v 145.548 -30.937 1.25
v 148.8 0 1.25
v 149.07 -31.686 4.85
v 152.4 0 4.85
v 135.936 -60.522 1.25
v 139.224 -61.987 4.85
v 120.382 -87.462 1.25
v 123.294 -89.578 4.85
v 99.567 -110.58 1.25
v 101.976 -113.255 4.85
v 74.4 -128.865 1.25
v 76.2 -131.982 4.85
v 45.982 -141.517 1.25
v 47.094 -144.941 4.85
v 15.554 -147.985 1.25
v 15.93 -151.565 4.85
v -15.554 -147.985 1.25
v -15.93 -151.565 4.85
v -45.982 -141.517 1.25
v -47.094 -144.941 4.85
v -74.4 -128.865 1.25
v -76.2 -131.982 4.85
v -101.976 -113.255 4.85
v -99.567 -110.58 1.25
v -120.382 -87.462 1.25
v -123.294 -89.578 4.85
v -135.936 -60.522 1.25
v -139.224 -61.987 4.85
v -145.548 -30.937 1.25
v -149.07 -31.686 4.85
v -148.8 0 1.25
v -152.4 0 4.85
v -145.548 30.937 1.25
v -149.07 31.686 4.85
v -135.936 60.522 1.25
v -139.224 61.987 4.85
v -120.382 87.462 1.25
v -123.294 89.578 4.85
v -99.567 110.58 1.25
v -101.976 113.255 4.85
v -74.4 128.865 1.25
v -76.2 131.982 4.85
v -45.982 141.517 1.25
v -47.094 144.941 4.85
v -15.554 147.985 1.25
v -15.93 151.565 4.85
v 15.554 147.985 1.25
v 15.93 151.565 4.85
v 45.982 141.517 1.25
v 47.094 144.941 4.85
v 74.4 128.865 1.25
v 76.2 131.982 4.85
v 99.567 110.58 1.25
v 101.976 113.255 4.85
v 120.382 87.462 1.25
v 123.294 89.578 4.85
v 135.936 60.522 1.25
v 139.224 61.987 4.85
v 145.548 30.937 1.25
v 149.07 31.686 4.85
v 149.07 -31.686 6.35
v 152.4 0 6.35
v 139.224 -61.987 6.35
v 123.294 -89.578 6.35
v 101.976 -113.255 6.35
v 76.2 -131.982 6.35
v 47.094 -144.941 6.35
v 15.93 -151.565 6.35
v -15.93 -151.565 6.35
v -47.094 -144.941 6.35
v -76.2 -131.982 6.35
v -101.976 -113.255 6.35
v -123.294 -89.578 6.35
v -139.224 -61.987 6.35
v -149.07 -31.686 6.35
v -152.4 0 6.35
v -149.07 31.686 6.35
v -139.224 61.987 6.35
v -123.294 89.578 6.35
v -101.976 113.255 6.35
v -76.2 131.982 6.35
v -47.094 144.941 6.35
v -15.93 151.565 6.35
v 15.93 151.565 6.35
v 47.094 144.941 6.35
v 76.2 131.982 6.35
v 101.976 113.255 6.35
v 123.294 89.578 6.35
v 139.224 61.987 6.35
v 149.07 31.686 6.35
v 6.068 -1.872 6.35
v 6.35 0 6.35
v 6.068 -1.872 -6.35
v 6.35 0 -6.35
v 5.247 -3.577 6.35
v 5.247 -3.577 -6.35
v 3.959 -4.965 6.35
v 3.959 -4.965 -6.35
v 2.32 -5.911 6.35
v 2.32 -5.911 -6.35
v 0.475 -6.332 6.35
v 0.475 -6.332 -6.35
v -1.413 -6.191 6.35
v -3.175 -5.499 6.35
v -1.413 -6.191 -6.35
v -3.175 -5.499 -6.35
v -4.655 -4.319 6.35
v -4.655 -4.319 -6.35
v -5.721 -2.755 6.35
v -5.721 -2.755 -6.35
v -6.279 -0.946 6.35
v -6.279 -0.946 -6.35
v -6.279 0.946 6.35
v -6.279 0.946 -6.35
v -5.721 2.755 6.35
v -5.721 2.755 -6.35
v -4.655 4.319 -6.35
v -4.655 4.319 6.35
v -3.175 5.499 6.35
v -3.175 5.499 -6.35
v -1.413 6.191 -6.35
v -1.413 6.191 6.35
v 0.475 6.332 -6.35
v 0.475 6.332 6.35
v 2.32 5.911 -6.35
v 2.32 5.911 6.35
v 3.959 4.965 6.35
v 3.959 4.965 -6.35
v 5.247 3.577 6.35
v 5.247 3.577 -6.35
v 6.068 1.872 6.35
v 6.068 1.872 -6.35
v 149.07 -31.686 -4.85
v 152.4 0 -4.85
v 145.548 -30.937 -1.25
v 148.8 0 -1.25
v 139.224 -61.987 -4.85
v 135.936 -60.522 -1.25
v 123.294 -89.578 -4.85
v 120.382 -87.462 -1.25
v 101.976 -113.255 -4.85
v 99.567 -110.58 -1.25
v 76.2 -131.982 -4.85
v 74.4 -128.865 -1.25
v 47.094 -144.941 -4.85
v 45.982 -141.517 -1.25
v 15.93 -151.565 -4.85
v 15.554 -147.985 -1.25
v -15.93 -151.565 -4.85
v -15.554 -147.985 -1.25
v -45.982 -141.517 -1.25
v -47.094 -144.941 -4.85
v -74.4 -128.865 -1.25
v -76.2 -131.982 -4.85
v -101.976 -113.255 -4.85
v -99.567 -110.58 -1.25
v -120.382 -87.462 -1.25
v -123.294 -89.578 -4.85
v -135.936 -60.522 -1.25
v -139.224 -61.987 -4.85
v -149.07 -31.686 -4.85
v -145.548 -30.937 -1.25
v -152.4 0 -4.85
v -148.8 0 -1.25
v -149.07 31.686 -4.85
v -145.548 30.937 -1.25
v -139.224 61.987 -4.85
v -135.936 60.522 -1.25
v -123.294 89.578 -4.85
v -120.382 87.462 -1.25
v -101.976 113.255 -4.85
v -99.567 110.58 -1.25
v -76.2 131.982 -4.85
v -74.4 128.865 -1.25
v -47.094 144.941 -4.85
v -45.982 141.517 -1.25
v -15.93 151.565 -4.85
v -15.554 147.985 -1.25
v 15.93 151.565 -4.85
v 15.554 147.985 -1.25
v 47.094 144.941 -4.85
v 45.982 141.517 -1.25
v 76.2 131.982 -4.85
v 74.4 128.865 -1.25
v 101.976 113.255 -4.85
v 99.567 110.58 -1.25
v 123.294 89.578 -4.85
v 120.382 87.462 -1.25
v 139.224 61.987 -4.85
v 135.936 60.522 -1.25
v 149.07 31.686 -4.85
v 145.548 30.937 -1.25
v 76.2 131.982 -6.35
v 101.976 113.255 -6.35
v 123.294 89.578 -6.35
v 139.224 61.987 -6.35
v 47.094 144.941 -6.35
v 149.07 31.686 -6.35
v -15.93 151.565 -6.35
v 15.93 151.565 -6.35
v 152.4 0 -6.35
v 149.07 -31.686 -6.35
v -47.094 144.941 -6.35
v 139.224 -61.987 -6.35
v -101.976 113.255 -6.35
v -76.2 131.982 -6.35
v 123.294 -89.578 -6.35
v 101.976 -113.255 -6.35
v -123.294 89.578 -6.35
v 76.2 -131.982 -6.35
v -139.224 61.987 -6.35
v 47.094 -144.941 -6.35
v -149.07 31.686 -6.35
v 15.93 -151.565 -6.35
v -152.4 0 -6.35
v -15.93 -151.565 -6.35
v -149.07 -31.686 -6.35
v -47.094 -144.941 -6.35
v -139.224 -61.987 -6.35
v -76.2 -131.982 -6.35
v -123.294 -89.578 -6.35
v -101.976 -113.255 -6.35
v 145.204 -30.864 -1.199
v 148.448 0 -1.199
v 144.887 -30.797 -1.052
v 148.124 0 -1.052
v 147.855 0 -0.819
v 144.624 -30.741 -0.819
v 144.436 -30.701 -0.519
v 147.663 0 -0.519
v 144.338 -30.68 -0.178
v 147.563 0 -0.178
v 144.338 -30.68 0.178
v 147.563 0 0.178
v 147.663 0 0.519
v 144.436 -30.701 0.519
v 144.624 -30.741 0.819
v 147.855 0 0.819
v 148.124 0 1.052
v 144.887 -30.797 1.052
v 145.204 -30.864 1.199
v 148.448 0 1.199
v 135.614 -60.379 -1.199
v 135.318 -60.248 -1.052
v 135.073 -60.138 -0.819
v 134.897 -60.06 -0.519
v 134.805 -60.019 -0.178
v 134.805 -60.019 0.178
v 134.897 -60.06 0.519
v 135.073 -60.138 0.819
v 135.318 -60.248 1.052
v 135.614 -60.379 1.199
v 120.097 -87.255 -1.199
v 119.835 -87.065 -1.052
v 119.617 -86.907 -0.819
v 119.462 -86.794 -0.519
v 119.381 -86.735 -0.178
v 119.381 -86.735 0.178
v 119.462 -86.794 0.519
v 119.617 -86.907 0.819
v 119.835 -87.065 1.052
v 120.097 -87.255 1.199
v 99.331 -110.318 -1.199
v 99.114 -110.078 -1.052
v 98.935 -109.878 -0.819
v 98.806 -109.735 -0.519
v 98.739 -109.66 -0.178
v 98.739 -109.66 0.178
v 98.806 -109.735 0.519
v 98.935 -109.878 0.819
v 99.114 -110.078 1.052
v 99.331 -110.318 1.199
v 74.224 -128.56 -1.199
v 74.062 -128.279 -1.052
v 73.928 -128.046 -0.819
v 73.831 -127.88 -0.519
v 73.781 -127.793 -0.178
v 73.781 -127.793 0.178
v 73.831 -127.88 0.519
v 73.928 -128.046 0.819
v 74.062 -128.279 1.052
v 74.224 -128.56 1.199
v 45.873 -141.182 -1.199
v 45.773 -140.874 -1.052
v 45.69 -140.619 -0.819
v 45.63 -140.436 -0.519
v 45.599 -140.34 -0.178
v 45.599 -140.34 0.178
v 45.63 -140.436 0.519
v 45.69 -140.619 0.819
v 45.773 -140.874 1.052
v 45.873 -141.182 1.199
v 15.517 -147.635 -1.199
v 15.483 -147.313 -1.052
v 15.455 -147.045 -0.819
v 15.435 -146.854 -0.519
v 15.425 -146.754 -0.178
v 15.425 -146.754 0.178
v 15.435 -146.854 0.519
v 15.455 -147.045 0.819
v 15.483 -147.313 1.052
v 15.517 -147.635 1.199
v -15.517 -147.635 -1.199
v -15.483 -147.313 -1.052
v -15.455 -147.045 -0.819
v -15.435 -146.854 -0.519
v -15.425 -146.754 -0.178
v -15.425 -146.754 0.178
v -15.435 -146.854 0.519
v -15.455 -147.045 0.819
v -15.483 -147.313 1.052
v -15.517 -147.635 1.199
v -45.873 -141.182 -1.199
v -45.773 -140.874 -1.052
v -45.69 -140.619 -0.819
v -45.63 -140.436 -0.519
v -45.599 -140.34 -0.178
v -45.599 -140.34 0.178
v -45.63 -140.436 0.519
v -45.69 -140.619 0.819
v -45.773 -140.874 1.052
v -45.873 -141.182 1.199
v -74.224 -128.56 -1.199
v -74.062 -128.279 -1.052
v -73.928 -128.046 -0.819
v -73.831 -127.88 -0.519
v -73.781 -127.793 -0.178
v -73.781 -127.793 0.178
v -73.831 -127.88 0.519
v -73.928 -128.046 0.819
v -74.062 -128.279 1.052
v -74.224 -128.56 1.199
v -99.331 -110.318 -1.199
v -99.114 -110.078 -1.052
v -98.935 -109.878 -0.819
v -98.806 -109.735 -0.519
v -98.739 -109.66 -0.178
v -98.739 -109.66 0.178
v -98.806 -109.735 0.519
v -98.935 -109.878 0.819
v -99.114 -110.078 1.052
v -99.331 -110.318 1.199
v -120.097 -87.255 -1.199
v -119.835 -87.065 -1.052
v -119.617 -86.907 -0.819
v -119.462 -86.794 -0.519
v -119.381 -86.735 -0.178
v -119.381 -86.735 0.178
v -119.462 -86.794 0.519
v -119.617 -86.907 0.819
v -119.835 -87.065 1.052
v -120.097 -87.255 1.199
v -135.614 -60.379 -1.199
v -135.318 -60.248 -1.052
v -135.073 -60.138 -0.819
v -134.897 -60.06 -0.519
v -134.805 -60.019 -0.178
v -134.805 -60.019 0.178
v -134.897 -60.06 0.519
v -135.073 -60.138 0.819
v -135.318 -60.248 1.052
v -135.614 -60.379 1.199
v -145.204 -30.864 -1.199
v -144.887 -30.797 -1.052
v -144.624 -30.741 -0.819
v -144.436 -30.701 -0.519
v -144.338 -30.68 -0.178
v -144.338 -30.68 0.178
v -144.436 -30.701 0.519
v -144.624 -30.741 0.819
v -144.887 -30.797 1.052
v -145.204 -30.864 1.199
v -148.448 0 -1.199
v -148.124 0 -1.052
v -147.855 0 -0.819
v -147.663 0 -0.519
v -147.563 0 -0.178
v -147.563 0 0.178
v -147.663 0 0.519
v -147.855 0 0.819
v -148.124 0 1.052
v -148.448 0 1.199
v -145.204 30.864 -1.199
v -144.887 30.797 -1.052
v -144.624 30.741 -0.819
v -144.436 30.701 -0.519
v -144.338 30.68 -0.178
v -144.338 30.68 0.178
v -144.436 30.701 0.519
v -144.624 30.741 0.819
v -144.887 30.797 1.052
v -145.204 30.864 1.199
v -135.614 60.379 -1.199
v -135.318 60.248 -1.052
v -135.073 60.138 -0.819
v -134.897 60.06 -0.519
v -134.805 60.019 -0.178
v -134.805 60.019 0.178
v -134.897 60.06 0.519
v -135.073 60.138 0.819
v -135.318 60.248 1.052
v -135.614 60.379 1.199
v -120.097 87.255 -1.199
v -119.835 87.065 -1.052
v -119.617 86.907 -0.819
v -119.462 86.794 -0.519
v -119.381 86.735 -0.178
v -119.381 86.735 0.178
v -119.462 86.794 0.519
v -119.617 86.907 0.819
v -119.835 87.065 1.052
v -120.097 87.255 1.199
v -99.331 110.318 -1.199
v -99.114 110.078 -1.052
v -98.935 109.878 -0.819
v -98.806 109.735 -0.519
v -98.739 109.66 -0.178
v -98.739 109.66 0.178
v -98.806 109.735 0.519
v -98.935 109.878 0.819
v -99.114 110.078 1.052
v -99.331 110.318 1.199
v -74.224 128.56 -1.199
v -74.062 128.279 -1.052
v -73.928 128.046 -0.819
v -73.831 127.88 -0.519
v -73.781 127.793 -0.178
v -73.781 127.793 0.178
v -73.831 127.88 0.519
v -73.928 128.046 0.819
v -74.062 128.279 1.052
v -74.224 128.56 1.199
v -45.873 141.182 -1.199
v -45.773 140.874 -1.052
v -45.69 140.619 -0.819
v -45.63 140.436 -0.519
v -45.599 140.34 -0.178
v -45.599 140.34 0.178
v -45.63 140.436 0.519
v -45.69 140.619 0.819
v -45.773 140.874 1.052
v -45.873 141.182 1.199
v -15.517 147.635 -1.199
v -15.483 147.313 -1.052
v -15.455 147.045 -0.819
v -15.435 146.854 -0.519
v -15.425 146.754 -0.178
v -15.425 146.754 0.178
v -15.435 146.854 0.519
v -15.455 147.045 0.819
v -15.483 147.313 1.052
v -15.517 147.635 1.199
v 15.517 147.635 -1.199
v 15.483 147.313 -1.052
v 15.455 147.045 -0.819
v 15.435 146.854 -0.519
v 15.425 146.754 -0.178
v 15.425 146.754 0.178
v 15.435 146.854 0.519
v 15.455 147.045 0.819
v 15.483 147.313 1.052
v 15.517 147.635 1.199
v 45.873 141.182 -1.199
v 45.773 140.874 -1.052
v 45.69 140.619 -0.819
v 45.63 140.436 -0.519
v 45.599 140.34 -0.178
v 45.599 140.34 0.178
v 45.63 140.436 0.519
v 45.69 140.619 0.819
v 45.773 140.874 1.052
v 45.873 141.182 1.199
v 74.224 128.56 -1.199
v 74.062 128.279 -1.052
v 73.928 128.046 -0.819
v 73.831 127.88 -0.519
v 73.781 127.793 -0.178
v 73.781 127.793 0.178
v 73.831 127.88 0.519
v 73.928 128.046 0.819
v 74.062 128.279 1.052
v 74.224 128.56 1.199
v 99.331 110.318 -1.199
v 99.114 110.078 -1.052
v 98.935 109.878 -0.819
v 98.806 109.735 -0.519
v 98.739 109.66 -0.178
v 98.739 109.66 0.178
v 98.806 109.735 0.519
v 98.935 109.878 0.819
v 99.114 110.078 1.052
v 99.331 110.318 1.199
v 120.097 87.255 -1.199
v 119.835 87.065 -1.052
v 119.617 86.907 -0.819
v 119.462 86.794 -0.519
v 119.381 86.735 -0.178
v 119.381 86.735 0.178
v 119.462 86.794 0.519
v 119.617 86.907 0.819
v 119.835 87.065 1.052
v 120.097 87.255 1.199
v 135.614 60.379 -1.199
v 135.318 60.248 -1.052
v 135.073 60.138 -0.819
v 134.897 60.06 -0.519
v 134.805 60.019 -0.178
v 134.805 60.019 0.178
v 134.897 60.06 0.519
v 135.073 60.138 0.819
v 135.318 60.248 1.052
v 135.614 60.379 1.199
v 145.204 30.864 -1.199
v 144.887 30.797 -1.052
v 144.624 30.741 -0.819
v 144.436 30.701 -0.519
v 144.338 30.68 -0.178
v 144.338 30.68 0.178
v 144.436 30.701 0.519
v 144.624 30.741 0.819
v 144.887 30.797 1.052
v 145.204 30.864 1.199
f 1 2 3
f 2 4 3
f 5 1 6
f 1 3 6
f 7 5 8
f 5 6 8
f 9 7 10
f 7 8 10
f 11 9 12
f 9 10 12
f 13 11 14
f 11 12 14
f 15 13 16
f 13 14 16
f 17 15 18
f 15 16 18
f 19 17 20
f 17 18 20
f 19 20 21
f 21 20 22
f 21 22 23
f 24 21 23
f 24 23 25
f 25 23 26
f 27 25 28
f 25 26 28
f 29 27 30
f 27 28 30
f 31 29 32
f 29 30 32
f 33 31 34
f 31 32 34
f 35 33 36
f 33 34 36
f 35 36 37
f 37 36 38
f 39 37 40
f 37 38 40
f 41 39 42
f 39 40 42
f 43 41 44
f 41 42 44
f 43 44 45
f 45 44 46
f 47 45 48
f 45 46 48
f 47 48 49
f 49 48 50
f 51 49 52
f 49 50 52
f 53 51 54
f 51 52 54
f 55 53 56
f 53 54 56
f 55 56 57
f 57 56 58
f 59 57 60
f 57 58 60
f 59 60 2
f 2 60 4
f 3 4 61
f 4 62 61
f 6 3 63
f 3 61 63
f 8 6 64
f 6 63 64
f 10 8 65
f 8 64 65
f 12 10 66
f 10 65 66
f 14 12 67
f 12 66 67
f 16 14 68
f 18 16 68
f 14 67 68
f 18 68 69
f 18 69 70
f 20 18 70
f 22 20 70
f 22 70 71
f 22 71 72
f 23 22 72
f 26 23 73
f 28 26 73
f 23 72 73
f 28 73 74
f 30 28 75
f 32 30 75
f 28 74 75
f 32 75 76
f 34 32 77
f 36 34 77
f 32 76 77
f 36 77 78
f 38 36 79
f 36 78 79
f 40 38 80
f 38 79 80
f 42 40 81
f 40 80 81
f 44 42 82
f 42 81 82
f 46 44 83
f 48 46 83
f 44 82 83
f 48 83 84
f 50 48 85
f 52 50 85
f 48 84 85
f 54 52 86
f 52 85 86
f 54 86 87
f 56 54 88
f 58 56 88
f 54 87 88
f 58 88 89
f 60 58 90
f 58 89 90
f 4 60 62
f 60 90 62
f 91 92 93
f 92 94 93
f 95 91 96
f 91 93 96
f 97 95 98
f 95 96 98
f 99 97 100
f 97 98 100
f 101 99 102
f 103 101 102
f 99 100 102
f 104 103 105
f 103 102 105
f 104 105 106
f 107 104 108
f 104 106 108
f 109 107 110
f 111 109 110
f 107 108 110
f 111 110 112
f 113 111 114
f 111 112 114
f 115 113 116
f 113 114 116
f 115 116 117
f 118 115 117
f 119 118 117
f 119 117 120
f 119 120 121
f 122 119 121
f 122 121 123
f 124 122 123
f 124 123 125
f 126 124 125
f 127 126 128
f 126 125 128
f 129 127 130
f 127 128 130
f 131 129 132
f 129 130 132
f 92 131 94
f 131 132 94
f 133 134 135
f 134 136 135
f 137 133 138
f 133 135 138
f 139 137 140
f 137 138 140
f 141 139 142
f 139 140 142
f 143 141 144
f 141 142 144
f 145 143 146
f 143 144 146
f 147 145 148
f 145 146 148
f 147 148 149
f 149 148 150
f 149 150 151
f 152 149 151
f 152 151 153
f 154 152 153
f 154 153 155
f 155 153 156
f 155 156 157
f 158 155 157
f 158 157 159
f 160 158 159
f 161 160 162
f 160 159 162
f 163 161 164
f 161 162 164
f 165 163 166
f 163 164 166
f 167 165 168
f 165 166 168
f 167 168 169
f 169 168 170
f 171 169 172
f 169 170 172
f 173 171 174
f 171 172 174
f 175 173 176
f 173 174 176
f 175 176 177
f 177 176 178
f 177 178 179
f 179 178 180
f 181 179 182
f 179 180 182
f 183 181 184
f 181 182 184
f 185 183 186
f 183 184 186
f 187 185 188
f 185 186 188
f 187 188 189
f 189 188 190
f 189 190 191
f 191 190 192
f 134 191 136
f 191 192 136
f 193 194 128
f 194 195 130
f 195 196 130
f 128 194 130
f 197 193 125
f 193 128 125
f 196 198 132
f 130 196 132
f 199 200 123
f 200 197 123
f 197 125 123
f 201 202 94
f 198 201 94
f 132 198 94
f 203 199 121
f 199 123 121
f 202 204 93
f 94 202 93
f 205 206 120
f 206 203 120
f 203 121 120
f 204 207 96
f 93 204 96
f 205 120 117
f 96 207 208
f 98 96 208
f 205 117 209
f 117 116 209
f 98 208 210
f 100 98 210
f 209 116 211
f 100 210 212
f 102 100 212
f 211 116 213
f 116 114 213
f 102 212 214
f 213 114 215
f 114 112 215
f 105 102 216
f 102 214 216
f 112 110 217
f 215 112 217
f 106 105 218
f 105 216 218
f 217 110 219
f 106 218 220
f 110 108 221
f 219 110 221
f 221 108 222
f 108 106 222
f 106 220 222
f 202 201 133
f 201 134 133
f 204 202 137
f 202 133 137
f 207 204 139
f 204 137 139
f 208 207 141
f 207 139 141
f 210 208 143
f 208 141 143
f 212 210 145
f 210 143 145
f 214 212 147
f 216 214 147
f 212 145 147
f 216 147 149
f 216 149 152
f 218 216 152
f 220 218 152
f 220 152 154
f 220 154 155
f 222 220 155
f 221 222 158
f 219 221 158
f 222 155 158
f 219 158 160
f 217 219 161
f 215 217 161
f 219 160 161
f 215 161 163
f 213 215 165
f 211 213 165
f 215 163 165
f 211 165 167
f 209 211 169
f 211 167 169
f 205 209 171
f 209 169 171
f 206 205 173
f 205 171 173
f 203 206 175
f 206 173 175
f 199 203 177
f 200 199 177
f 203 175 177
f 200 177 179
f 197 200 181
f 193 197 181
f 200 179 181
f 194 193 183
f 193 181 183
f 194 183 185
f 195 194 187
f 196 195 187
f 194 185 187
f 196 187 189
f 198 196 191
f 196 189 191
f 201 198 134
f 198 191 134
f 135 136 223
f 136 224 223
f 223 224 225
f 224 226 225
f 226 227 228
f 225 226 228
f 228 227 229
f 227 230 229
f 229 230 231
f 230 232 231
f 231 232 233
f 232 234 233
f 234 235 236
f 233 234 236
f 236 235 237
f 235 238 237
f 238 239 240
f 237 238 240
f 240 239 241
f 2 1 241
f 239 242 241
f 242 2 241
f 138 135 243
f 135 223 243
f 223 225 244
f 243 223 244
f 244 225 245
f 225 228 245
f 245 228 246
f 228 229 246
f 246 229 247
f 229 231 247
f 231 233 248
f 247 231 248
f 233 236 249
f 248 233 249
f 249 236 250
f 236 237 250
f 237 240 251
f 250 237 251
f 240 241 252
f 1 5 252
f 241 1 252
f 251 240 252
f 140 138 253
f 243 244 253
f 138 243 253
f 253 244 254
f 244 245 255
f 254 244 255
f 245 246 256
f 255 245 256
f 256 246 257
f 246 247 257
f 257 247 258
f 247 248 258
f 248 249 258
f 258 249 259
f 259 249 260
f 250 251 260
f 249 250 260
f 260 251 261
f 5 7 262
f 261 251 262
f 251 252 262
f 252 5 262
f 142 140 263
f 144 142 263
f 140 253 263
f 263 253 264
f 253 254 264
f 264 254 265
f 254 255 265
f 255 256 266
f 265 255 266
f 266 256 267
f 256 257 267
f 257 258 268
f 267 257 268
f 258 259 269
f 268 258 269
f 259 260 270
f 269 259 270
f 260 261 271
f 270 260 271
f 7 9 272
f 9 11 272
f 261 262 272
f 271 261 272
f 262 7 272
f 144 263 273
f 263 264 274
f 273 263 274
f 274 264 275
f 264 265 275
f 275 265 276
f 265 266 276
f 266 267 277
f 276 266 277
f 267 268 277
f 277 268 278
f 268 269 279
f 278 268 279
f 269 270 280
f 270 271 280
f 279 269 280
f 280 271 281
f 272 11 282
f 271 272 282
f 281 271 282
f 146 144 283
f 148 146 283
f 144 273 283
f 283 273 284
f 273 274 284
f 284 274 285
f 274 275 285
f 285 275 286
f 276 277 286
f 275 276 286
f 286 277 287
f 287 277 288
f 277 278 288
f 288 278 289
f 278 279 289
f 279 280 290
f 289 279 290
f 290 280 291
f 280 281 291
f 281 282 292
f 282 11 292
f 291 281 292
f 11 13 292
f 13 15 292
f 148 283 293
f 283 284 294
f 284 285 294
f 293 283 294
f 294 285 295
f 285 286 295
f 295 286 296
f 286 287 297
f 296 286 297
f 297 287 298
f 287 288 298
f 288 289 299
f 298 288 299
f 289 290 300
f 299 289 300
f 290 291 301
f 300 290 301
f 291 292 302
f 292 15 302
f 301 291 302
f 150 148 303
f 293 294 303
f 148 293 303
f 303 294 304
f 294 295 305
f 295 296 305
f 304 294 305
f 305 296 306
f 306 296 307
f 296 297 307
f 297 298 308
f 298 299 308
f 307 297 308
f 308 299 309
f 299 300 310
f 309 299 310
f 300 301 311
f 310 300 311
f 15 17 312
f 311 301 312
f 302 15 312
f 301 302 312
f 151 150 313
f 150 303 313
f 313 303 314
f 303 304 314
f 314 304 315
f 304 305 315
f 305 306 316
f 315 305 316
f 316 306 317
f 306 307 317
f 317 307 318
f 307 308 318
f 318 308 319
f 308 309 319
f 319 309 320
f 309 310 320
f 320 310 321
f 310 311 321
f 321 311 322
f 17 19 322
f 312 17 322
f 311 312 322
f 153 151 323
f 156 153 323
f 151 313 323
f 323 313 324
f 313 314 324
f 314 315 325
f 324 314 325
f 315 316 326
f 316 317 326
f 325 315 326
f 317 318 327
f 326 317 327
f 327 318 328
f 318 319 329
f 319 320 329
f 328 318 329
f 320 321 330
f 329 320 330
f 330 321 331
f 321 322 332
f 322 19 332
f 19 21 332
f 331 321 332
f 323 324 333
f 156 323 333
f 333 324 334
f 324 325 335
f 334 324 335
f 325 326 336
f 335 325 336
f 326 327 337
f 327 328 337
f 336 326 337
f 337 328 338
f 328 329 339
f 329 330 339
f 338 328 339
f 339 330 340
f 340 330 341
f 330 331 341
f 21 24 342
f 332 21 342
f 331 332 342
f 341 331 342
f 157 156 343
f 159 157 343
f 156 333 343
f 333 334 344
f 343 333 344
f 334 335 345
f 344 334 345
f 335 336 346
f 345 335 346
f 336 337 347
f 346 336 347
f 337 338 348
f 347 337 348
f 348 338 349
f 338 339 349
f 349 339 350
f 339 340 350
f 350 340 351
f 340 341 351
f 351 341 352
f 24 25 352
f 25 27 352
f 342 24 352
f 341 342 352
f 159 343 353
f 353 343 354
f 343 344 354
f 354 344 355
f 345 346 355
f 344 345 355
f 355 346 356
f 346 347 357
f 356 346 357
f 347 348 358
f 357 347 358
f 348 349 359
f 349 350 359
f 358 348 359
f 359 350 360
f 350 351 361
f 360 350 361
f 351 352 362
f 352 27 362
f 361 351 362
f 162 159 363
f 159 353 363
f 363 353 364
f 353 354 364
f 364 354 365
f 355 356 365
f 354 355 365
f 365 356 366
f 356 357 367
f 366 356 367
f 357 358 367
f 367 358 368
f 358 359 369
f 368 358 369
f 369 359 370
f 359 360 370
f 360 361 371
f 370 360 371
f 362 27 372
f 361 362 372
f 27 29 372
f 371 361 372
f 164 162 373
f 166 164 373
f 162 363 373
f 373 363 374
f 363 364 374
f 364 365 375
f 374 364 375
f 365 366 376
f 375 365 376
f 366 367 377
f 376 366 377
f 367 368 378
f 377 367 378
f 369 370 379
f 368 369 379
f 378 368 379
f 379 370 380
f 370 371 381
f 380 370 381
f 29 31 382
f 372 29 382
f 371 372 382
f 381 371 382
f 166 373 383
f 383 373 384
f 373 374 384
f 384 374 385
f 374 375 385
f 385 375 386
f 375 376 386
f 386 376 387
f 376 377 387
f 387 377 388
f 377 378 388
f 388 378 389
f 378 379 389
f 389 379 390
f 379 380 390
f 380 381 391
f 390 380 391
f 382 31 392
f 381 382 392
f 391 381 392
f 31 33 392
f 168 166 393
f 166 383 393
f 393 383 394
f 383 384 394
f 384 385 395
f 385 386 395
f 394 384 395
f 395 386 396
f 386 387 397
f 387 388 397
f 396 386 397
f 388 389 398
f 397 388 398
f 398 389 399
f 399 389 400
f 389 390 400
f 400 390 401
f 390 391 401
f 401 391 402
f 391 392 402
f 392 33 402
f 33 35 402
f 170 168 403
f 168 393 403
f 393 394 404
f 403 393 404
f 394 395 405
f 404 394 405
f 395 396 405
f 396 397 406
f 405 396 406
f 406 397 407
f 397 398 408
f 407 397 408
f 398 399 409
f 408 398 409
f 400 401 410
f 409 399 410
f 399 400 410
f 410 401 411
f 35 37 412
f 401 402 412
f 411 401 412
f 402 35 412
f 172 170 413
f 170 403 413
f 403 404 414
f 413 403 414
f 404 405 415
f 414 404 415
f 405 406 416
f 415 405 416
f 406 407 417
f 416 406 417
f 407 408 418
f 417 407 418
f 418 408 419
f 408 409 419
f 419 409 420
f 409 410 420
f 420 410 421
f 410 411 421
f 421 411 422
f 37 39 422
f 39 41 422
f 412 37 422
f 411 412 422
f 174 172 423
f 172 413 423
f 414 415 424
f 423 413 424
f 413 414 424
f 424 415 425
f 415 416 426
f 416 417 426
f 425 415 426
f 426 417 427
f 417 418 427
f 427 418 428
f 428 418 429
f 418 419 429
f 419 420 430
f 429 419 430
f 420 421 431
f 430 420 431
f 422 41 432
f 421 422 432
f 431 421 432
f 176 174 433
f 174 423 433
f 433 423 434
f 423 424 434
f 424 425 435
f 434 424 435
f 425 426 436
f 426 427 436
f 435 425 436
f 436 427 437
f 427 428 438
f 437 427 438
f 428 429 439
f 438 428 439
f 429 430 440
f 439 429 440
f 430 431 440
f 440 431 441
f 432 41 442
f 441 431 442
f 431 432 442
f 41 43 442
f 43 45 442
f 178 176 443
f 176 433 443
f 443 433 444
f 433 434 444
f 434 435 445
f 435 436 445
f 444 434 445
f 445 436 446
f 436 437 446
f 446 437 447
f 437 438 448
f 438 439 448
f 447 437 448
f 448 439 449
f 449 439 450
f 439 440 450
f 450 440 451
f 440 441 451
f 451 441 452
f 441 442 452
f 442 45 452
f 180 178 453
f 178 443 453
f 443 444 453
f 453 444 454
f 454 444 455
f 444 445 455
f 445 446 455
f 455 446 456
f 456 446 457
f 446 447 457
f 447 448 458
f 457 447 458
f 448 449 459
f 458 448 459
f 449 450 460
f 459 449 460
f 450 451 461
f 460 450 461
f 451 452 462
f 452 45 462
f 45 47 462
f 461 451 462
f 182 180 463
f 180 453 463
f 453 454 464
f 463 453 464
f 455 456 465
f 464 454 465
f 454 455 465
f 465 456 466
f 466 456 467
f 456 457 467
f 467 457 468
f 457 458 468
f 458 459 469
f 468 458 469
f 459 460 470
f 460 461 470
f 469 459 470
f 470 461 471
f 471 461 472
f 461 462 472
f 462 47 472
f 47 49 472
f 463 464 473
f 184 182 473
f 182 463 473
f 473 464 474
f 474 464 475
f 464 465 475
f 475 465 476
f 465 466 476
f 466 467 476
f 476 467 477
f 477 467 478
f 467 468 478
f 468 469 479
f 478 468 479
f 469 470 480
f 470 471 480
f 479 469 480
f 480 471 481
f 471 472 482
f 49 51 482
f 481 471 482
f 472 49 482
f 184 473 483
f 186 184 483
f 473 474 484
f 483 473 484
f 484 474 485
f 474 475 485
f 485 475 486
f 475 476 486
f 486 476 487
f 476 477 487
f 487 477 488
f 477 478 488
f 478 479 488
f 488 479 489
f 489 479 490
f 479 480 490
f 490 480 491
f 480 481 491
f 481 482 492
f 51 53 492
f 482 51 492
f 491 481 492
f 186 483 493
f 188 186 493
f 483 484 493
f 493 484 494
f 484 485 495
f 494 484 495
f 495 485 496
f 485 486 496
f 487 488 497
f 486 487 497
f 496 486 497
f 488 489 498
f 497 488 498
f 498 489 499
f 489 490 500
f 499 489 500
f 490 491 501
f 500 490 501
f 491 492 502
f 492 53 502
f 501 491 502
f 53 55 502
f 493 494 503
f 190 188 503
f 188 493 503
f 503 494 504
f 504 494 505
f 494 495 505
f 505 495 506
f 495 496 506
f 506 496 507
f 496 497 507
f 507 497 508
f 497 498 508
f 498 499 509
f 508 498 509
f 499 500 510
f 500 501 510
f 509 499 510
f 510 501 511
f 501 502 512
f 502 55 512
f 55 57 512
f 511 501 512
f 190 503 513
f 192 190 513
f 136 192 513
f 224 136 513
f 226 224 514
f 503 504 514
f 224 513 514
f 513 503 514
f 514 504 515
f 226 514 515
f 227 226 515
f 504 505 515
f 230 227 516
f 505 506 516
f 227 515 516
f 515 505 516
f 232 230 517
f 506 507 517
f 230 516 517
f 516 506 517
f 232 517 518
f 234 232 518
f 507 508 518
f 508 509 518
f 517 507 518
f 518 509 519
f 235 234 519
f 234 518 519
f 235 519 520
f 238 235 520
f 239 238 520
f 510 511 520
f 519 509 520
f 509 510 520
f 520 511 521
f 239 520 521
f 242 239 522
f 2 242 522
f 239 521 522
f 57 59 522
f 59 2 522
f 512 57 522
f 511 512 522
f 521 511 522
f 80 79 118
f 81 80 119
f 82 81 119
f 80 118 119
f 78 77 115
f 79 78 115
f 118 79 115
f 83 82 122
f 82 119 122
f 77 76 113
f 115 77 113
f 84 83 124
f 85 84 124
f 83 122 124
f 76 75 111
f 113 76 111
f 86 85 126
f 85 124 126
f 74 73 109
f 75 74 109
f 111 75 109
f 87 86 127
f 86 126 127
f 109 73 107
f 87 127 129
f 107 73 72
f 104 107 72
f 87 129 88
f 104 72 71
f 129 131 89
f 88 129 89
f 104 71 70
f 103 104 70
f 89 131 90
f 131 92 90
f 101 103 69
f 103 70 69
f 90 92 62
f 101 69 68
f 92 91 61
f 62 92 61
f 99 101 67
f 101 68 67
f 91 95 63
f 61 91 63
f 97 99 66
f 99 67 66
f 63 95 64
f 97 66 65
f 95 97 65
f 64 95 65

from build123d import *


with BuildPart() as part:
    # Sketch1 → Revolve1 (revolve)
    with BuildSketch(Plane(origin=(0, 0, 0), x_dir=(1, 0, 0), z_dir=(0, 1, 0))):
        with BuildLine():
            Line((6.35, 6.35), (152.4, 6.35))
            Line((152.4, 6.35), (152.4, 4.85))
            Line((152.4, 4.85), (148.8, 1.25))
            ThreePointArc((148.8, 1.25), (147.55, 0), (148.8, -1.25))
            Line((148.8, -1.25), (152.4, -4.85))
            Line((152.4, -4.85), (152.4, -6.35))
            Line((152.4, -6.35), (6.35, -6.35))
            Line((6.35, -6.35), (6.35, 6.35))
        make_face()
    revolve(axis=Axis((0, 0, 6.35), (0, 0, -1)))


solid = part.part
